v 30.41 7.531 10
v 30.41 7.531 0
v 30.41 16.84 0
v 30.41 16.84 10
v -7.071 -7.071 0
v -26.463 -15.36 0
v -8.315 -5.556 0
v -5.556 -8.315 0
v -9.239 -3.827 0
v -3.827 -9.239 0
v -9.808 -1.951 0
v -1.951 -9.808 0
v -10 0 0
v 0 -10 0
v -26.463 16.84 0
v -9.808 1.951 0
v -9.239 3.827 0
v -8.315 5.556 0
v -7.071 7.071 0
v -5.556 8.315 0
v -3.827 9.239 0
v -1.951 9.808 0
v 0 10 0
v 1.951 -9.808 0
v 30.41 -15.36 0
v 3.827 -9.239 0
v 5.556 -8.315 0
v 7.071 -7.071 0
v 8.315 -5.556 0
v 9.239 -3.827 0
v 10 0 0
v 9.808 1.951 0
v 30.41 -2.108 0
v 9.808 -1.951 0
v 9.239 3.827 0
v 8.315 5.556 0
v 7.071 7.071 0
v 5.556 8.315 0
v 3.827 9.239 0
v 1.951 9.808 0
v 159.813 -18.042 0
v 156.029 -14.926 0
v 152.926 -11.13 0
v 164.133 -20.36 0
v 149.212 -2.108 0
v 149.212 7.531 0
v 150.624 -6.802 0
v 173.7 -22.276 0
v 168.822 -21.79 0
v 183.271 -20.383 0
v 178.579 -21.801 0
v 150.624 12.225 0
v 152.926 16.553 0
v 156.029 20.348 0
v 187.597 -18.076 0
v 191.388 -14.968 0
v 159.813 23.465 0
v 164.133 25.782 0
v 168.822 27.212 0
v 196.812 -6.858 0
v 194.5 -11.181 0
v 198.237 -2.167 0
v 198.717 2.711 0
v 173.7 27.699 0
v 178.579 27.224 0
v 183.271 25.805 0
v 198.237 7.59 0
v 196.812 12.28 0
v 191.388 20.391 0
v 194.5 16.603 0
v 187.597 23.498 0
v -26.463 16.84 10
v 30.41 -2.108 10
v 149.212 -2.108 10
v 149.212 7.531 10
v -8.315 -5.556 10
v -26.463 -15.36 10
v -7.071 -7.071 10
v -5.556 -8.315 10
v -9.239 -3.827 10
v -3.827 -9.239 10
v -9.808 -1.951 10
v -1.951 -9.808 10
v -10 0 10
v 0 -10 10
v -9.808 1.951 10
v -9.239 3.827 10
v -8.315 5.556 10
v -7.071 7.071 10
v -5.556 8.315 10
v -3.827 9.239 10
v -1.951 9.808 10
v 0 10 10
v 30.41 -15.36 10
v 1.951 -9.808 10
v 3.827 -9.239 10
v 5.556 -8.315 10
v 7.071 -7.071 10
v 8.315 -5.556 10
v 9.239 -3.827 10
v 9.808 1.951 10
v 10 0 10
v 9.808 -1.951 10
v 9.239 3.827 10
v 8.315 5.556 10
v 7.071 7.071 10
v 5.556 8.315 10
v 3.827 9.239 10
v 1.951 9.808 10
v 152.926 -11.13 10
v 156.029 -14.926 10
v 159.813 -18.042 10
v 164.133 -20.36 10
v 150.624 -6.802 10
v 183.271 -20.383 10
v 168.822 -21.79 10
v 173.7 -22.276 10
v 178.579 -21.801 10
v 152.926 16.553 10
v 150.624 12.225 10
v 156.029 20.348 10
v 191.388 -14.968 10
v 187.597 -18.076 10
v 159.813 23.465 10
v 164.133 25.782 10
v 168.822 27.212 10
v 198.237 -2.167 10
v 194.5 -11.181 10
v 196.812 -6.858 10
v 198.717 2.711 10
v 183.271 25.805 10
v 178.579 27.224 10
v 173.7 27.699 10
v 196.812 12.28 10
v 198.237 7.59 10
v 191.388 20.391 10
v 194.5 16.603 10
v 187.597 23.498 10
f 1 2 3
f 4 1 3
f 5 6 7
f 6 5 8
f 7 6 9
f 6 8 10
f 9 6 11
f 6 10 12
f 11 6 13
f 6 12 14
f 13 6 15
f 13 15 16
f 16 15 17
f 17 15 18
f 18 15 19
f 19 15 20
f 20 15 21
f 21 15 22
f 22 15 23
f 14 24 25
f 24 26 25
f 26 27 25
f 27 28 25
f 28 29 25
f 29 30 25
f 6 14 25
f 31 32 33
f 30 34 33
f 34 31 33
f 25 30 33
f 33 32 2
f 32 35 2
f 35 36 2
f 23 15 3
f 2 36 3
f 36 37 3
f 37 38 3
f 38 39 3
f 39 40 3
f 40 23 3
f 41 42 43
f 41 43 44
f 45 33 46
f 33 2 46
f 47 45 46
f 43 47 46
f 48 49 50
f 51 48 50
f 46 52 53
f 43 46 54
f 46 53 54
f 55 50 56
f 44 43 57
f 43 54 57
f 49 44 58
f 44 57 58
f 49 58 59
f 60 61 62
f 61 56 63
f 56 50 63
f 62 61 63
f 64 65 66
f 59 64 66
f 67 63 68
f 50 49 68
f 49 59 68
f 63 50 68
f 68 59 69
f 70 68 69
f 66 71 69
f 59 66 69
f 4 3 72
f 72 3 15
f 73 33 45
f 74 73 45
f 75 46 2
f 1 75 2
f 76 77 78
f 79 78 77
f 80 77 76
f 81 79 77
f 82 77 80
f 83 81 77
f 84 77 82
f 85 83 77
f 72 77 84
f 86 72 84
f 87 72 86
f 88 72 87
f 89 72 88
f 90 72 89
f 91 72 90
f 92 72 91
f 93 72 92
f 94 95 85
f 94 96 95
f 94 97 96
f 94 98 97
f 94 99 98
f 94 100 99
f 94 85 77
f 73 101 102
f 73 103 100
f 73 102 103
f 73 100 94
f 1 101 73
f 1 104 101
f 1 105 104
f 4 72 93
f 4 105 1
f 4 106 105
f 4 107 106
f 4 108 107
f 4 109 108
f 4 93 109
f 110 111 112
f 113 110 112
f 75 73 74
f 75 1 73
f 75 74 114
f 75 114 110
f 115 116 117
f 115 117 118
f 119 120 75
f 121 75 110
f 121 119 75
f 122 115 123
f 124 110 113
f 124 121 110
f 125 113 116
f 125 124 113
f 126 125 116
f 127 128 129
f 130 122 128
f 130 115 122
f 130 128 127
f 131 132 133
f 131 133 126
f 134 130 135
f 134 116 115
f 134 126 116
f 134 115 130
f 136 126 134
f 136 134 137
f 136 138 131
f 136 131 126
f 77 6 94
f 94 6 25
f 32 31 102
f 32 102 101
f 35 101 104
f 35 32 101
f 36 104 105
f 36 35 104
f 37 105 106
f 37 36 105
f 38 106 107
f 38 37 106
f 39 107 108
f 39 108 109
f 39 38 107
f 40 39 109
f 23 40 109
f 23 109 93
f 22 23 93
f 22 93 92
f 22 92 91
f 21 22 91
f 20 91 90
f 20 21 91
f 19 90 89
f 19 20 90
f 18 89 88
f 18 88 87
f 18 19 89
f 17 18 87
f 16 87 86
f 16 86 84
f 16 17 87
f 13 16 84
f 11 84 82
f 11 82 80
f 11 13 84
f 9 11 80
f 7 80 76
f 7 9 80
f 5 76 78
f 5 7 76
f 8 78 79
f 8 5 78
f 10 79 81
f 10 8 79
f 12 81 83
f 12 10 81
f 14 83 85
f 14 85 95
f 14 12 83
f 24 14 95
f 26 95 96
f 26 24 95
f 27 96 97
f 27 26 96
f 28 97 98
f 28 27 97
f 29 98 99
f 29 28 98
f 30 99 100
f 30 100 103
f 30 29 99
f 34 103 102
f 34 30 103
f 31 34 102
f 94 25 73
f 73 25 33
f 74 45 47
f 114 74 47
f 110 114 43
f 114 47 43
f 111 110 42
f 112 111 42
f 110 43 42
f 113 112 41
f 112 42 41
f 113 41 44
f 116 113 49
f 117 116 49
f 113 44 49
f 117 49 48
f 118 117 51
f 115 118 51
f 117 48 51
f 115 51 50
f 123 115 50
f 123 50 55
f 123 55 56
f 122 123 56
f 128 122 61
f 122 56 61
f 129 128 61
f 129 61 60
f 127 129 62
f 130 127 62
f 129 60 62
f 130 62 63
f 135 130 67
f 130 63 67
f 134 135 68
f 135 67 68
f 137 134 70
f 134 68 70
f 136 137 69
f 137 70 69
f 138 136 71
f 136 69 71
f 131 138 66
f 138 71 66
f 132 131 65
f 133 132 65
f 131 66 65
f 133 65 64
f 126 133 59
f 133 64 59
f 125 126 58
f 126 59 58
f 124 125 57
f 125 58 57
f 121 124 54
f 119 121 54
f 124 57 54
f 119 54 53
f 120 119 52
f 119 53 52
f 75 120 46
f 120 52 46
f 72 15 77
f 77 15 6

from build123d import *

# Parameters (mm, degrees)
SKETCH1_R           = 10
BOSS_EXTRUDE1_DEPTH = 10


with BuildPart() as part:
    # Sketch1 → Boss-Extrude1 (new body)
    with BuildSketch(Plane.XY):
        with BuildLine():
            Line((30.40998342, 7.530623632), (30.40998342, 16.840305532))
            Line((30.40998342, 16.840305532), (-26.463337265, 16.840305532))
            Line((-26.463337265, 16.840305532), (-26.463337265, -15.359839112))
            Line((-26.463337265, -15.359839112), (30.40998342, -15.359839112))
            Line((30.40998342, -15.359839112), (30.40998342, -2.10831855))
            Line((30.40998342, -2.10831855), (149.211555262, -2.10831855))
            ThreePointArc((149.211555262, -2.10831855), (198.71742784, 2.711152541), (149.211555262, 7.530623632))
            Line((149.211555262, 7.530623632), (30.40998342, 7.530623632))
        make_face()
        Circle(SKETCH1_R, mode=Mode.SUBTRACT)
    extrude(amount=BOSS_EXTRUDE1_DEPTH)


solid = part.part
